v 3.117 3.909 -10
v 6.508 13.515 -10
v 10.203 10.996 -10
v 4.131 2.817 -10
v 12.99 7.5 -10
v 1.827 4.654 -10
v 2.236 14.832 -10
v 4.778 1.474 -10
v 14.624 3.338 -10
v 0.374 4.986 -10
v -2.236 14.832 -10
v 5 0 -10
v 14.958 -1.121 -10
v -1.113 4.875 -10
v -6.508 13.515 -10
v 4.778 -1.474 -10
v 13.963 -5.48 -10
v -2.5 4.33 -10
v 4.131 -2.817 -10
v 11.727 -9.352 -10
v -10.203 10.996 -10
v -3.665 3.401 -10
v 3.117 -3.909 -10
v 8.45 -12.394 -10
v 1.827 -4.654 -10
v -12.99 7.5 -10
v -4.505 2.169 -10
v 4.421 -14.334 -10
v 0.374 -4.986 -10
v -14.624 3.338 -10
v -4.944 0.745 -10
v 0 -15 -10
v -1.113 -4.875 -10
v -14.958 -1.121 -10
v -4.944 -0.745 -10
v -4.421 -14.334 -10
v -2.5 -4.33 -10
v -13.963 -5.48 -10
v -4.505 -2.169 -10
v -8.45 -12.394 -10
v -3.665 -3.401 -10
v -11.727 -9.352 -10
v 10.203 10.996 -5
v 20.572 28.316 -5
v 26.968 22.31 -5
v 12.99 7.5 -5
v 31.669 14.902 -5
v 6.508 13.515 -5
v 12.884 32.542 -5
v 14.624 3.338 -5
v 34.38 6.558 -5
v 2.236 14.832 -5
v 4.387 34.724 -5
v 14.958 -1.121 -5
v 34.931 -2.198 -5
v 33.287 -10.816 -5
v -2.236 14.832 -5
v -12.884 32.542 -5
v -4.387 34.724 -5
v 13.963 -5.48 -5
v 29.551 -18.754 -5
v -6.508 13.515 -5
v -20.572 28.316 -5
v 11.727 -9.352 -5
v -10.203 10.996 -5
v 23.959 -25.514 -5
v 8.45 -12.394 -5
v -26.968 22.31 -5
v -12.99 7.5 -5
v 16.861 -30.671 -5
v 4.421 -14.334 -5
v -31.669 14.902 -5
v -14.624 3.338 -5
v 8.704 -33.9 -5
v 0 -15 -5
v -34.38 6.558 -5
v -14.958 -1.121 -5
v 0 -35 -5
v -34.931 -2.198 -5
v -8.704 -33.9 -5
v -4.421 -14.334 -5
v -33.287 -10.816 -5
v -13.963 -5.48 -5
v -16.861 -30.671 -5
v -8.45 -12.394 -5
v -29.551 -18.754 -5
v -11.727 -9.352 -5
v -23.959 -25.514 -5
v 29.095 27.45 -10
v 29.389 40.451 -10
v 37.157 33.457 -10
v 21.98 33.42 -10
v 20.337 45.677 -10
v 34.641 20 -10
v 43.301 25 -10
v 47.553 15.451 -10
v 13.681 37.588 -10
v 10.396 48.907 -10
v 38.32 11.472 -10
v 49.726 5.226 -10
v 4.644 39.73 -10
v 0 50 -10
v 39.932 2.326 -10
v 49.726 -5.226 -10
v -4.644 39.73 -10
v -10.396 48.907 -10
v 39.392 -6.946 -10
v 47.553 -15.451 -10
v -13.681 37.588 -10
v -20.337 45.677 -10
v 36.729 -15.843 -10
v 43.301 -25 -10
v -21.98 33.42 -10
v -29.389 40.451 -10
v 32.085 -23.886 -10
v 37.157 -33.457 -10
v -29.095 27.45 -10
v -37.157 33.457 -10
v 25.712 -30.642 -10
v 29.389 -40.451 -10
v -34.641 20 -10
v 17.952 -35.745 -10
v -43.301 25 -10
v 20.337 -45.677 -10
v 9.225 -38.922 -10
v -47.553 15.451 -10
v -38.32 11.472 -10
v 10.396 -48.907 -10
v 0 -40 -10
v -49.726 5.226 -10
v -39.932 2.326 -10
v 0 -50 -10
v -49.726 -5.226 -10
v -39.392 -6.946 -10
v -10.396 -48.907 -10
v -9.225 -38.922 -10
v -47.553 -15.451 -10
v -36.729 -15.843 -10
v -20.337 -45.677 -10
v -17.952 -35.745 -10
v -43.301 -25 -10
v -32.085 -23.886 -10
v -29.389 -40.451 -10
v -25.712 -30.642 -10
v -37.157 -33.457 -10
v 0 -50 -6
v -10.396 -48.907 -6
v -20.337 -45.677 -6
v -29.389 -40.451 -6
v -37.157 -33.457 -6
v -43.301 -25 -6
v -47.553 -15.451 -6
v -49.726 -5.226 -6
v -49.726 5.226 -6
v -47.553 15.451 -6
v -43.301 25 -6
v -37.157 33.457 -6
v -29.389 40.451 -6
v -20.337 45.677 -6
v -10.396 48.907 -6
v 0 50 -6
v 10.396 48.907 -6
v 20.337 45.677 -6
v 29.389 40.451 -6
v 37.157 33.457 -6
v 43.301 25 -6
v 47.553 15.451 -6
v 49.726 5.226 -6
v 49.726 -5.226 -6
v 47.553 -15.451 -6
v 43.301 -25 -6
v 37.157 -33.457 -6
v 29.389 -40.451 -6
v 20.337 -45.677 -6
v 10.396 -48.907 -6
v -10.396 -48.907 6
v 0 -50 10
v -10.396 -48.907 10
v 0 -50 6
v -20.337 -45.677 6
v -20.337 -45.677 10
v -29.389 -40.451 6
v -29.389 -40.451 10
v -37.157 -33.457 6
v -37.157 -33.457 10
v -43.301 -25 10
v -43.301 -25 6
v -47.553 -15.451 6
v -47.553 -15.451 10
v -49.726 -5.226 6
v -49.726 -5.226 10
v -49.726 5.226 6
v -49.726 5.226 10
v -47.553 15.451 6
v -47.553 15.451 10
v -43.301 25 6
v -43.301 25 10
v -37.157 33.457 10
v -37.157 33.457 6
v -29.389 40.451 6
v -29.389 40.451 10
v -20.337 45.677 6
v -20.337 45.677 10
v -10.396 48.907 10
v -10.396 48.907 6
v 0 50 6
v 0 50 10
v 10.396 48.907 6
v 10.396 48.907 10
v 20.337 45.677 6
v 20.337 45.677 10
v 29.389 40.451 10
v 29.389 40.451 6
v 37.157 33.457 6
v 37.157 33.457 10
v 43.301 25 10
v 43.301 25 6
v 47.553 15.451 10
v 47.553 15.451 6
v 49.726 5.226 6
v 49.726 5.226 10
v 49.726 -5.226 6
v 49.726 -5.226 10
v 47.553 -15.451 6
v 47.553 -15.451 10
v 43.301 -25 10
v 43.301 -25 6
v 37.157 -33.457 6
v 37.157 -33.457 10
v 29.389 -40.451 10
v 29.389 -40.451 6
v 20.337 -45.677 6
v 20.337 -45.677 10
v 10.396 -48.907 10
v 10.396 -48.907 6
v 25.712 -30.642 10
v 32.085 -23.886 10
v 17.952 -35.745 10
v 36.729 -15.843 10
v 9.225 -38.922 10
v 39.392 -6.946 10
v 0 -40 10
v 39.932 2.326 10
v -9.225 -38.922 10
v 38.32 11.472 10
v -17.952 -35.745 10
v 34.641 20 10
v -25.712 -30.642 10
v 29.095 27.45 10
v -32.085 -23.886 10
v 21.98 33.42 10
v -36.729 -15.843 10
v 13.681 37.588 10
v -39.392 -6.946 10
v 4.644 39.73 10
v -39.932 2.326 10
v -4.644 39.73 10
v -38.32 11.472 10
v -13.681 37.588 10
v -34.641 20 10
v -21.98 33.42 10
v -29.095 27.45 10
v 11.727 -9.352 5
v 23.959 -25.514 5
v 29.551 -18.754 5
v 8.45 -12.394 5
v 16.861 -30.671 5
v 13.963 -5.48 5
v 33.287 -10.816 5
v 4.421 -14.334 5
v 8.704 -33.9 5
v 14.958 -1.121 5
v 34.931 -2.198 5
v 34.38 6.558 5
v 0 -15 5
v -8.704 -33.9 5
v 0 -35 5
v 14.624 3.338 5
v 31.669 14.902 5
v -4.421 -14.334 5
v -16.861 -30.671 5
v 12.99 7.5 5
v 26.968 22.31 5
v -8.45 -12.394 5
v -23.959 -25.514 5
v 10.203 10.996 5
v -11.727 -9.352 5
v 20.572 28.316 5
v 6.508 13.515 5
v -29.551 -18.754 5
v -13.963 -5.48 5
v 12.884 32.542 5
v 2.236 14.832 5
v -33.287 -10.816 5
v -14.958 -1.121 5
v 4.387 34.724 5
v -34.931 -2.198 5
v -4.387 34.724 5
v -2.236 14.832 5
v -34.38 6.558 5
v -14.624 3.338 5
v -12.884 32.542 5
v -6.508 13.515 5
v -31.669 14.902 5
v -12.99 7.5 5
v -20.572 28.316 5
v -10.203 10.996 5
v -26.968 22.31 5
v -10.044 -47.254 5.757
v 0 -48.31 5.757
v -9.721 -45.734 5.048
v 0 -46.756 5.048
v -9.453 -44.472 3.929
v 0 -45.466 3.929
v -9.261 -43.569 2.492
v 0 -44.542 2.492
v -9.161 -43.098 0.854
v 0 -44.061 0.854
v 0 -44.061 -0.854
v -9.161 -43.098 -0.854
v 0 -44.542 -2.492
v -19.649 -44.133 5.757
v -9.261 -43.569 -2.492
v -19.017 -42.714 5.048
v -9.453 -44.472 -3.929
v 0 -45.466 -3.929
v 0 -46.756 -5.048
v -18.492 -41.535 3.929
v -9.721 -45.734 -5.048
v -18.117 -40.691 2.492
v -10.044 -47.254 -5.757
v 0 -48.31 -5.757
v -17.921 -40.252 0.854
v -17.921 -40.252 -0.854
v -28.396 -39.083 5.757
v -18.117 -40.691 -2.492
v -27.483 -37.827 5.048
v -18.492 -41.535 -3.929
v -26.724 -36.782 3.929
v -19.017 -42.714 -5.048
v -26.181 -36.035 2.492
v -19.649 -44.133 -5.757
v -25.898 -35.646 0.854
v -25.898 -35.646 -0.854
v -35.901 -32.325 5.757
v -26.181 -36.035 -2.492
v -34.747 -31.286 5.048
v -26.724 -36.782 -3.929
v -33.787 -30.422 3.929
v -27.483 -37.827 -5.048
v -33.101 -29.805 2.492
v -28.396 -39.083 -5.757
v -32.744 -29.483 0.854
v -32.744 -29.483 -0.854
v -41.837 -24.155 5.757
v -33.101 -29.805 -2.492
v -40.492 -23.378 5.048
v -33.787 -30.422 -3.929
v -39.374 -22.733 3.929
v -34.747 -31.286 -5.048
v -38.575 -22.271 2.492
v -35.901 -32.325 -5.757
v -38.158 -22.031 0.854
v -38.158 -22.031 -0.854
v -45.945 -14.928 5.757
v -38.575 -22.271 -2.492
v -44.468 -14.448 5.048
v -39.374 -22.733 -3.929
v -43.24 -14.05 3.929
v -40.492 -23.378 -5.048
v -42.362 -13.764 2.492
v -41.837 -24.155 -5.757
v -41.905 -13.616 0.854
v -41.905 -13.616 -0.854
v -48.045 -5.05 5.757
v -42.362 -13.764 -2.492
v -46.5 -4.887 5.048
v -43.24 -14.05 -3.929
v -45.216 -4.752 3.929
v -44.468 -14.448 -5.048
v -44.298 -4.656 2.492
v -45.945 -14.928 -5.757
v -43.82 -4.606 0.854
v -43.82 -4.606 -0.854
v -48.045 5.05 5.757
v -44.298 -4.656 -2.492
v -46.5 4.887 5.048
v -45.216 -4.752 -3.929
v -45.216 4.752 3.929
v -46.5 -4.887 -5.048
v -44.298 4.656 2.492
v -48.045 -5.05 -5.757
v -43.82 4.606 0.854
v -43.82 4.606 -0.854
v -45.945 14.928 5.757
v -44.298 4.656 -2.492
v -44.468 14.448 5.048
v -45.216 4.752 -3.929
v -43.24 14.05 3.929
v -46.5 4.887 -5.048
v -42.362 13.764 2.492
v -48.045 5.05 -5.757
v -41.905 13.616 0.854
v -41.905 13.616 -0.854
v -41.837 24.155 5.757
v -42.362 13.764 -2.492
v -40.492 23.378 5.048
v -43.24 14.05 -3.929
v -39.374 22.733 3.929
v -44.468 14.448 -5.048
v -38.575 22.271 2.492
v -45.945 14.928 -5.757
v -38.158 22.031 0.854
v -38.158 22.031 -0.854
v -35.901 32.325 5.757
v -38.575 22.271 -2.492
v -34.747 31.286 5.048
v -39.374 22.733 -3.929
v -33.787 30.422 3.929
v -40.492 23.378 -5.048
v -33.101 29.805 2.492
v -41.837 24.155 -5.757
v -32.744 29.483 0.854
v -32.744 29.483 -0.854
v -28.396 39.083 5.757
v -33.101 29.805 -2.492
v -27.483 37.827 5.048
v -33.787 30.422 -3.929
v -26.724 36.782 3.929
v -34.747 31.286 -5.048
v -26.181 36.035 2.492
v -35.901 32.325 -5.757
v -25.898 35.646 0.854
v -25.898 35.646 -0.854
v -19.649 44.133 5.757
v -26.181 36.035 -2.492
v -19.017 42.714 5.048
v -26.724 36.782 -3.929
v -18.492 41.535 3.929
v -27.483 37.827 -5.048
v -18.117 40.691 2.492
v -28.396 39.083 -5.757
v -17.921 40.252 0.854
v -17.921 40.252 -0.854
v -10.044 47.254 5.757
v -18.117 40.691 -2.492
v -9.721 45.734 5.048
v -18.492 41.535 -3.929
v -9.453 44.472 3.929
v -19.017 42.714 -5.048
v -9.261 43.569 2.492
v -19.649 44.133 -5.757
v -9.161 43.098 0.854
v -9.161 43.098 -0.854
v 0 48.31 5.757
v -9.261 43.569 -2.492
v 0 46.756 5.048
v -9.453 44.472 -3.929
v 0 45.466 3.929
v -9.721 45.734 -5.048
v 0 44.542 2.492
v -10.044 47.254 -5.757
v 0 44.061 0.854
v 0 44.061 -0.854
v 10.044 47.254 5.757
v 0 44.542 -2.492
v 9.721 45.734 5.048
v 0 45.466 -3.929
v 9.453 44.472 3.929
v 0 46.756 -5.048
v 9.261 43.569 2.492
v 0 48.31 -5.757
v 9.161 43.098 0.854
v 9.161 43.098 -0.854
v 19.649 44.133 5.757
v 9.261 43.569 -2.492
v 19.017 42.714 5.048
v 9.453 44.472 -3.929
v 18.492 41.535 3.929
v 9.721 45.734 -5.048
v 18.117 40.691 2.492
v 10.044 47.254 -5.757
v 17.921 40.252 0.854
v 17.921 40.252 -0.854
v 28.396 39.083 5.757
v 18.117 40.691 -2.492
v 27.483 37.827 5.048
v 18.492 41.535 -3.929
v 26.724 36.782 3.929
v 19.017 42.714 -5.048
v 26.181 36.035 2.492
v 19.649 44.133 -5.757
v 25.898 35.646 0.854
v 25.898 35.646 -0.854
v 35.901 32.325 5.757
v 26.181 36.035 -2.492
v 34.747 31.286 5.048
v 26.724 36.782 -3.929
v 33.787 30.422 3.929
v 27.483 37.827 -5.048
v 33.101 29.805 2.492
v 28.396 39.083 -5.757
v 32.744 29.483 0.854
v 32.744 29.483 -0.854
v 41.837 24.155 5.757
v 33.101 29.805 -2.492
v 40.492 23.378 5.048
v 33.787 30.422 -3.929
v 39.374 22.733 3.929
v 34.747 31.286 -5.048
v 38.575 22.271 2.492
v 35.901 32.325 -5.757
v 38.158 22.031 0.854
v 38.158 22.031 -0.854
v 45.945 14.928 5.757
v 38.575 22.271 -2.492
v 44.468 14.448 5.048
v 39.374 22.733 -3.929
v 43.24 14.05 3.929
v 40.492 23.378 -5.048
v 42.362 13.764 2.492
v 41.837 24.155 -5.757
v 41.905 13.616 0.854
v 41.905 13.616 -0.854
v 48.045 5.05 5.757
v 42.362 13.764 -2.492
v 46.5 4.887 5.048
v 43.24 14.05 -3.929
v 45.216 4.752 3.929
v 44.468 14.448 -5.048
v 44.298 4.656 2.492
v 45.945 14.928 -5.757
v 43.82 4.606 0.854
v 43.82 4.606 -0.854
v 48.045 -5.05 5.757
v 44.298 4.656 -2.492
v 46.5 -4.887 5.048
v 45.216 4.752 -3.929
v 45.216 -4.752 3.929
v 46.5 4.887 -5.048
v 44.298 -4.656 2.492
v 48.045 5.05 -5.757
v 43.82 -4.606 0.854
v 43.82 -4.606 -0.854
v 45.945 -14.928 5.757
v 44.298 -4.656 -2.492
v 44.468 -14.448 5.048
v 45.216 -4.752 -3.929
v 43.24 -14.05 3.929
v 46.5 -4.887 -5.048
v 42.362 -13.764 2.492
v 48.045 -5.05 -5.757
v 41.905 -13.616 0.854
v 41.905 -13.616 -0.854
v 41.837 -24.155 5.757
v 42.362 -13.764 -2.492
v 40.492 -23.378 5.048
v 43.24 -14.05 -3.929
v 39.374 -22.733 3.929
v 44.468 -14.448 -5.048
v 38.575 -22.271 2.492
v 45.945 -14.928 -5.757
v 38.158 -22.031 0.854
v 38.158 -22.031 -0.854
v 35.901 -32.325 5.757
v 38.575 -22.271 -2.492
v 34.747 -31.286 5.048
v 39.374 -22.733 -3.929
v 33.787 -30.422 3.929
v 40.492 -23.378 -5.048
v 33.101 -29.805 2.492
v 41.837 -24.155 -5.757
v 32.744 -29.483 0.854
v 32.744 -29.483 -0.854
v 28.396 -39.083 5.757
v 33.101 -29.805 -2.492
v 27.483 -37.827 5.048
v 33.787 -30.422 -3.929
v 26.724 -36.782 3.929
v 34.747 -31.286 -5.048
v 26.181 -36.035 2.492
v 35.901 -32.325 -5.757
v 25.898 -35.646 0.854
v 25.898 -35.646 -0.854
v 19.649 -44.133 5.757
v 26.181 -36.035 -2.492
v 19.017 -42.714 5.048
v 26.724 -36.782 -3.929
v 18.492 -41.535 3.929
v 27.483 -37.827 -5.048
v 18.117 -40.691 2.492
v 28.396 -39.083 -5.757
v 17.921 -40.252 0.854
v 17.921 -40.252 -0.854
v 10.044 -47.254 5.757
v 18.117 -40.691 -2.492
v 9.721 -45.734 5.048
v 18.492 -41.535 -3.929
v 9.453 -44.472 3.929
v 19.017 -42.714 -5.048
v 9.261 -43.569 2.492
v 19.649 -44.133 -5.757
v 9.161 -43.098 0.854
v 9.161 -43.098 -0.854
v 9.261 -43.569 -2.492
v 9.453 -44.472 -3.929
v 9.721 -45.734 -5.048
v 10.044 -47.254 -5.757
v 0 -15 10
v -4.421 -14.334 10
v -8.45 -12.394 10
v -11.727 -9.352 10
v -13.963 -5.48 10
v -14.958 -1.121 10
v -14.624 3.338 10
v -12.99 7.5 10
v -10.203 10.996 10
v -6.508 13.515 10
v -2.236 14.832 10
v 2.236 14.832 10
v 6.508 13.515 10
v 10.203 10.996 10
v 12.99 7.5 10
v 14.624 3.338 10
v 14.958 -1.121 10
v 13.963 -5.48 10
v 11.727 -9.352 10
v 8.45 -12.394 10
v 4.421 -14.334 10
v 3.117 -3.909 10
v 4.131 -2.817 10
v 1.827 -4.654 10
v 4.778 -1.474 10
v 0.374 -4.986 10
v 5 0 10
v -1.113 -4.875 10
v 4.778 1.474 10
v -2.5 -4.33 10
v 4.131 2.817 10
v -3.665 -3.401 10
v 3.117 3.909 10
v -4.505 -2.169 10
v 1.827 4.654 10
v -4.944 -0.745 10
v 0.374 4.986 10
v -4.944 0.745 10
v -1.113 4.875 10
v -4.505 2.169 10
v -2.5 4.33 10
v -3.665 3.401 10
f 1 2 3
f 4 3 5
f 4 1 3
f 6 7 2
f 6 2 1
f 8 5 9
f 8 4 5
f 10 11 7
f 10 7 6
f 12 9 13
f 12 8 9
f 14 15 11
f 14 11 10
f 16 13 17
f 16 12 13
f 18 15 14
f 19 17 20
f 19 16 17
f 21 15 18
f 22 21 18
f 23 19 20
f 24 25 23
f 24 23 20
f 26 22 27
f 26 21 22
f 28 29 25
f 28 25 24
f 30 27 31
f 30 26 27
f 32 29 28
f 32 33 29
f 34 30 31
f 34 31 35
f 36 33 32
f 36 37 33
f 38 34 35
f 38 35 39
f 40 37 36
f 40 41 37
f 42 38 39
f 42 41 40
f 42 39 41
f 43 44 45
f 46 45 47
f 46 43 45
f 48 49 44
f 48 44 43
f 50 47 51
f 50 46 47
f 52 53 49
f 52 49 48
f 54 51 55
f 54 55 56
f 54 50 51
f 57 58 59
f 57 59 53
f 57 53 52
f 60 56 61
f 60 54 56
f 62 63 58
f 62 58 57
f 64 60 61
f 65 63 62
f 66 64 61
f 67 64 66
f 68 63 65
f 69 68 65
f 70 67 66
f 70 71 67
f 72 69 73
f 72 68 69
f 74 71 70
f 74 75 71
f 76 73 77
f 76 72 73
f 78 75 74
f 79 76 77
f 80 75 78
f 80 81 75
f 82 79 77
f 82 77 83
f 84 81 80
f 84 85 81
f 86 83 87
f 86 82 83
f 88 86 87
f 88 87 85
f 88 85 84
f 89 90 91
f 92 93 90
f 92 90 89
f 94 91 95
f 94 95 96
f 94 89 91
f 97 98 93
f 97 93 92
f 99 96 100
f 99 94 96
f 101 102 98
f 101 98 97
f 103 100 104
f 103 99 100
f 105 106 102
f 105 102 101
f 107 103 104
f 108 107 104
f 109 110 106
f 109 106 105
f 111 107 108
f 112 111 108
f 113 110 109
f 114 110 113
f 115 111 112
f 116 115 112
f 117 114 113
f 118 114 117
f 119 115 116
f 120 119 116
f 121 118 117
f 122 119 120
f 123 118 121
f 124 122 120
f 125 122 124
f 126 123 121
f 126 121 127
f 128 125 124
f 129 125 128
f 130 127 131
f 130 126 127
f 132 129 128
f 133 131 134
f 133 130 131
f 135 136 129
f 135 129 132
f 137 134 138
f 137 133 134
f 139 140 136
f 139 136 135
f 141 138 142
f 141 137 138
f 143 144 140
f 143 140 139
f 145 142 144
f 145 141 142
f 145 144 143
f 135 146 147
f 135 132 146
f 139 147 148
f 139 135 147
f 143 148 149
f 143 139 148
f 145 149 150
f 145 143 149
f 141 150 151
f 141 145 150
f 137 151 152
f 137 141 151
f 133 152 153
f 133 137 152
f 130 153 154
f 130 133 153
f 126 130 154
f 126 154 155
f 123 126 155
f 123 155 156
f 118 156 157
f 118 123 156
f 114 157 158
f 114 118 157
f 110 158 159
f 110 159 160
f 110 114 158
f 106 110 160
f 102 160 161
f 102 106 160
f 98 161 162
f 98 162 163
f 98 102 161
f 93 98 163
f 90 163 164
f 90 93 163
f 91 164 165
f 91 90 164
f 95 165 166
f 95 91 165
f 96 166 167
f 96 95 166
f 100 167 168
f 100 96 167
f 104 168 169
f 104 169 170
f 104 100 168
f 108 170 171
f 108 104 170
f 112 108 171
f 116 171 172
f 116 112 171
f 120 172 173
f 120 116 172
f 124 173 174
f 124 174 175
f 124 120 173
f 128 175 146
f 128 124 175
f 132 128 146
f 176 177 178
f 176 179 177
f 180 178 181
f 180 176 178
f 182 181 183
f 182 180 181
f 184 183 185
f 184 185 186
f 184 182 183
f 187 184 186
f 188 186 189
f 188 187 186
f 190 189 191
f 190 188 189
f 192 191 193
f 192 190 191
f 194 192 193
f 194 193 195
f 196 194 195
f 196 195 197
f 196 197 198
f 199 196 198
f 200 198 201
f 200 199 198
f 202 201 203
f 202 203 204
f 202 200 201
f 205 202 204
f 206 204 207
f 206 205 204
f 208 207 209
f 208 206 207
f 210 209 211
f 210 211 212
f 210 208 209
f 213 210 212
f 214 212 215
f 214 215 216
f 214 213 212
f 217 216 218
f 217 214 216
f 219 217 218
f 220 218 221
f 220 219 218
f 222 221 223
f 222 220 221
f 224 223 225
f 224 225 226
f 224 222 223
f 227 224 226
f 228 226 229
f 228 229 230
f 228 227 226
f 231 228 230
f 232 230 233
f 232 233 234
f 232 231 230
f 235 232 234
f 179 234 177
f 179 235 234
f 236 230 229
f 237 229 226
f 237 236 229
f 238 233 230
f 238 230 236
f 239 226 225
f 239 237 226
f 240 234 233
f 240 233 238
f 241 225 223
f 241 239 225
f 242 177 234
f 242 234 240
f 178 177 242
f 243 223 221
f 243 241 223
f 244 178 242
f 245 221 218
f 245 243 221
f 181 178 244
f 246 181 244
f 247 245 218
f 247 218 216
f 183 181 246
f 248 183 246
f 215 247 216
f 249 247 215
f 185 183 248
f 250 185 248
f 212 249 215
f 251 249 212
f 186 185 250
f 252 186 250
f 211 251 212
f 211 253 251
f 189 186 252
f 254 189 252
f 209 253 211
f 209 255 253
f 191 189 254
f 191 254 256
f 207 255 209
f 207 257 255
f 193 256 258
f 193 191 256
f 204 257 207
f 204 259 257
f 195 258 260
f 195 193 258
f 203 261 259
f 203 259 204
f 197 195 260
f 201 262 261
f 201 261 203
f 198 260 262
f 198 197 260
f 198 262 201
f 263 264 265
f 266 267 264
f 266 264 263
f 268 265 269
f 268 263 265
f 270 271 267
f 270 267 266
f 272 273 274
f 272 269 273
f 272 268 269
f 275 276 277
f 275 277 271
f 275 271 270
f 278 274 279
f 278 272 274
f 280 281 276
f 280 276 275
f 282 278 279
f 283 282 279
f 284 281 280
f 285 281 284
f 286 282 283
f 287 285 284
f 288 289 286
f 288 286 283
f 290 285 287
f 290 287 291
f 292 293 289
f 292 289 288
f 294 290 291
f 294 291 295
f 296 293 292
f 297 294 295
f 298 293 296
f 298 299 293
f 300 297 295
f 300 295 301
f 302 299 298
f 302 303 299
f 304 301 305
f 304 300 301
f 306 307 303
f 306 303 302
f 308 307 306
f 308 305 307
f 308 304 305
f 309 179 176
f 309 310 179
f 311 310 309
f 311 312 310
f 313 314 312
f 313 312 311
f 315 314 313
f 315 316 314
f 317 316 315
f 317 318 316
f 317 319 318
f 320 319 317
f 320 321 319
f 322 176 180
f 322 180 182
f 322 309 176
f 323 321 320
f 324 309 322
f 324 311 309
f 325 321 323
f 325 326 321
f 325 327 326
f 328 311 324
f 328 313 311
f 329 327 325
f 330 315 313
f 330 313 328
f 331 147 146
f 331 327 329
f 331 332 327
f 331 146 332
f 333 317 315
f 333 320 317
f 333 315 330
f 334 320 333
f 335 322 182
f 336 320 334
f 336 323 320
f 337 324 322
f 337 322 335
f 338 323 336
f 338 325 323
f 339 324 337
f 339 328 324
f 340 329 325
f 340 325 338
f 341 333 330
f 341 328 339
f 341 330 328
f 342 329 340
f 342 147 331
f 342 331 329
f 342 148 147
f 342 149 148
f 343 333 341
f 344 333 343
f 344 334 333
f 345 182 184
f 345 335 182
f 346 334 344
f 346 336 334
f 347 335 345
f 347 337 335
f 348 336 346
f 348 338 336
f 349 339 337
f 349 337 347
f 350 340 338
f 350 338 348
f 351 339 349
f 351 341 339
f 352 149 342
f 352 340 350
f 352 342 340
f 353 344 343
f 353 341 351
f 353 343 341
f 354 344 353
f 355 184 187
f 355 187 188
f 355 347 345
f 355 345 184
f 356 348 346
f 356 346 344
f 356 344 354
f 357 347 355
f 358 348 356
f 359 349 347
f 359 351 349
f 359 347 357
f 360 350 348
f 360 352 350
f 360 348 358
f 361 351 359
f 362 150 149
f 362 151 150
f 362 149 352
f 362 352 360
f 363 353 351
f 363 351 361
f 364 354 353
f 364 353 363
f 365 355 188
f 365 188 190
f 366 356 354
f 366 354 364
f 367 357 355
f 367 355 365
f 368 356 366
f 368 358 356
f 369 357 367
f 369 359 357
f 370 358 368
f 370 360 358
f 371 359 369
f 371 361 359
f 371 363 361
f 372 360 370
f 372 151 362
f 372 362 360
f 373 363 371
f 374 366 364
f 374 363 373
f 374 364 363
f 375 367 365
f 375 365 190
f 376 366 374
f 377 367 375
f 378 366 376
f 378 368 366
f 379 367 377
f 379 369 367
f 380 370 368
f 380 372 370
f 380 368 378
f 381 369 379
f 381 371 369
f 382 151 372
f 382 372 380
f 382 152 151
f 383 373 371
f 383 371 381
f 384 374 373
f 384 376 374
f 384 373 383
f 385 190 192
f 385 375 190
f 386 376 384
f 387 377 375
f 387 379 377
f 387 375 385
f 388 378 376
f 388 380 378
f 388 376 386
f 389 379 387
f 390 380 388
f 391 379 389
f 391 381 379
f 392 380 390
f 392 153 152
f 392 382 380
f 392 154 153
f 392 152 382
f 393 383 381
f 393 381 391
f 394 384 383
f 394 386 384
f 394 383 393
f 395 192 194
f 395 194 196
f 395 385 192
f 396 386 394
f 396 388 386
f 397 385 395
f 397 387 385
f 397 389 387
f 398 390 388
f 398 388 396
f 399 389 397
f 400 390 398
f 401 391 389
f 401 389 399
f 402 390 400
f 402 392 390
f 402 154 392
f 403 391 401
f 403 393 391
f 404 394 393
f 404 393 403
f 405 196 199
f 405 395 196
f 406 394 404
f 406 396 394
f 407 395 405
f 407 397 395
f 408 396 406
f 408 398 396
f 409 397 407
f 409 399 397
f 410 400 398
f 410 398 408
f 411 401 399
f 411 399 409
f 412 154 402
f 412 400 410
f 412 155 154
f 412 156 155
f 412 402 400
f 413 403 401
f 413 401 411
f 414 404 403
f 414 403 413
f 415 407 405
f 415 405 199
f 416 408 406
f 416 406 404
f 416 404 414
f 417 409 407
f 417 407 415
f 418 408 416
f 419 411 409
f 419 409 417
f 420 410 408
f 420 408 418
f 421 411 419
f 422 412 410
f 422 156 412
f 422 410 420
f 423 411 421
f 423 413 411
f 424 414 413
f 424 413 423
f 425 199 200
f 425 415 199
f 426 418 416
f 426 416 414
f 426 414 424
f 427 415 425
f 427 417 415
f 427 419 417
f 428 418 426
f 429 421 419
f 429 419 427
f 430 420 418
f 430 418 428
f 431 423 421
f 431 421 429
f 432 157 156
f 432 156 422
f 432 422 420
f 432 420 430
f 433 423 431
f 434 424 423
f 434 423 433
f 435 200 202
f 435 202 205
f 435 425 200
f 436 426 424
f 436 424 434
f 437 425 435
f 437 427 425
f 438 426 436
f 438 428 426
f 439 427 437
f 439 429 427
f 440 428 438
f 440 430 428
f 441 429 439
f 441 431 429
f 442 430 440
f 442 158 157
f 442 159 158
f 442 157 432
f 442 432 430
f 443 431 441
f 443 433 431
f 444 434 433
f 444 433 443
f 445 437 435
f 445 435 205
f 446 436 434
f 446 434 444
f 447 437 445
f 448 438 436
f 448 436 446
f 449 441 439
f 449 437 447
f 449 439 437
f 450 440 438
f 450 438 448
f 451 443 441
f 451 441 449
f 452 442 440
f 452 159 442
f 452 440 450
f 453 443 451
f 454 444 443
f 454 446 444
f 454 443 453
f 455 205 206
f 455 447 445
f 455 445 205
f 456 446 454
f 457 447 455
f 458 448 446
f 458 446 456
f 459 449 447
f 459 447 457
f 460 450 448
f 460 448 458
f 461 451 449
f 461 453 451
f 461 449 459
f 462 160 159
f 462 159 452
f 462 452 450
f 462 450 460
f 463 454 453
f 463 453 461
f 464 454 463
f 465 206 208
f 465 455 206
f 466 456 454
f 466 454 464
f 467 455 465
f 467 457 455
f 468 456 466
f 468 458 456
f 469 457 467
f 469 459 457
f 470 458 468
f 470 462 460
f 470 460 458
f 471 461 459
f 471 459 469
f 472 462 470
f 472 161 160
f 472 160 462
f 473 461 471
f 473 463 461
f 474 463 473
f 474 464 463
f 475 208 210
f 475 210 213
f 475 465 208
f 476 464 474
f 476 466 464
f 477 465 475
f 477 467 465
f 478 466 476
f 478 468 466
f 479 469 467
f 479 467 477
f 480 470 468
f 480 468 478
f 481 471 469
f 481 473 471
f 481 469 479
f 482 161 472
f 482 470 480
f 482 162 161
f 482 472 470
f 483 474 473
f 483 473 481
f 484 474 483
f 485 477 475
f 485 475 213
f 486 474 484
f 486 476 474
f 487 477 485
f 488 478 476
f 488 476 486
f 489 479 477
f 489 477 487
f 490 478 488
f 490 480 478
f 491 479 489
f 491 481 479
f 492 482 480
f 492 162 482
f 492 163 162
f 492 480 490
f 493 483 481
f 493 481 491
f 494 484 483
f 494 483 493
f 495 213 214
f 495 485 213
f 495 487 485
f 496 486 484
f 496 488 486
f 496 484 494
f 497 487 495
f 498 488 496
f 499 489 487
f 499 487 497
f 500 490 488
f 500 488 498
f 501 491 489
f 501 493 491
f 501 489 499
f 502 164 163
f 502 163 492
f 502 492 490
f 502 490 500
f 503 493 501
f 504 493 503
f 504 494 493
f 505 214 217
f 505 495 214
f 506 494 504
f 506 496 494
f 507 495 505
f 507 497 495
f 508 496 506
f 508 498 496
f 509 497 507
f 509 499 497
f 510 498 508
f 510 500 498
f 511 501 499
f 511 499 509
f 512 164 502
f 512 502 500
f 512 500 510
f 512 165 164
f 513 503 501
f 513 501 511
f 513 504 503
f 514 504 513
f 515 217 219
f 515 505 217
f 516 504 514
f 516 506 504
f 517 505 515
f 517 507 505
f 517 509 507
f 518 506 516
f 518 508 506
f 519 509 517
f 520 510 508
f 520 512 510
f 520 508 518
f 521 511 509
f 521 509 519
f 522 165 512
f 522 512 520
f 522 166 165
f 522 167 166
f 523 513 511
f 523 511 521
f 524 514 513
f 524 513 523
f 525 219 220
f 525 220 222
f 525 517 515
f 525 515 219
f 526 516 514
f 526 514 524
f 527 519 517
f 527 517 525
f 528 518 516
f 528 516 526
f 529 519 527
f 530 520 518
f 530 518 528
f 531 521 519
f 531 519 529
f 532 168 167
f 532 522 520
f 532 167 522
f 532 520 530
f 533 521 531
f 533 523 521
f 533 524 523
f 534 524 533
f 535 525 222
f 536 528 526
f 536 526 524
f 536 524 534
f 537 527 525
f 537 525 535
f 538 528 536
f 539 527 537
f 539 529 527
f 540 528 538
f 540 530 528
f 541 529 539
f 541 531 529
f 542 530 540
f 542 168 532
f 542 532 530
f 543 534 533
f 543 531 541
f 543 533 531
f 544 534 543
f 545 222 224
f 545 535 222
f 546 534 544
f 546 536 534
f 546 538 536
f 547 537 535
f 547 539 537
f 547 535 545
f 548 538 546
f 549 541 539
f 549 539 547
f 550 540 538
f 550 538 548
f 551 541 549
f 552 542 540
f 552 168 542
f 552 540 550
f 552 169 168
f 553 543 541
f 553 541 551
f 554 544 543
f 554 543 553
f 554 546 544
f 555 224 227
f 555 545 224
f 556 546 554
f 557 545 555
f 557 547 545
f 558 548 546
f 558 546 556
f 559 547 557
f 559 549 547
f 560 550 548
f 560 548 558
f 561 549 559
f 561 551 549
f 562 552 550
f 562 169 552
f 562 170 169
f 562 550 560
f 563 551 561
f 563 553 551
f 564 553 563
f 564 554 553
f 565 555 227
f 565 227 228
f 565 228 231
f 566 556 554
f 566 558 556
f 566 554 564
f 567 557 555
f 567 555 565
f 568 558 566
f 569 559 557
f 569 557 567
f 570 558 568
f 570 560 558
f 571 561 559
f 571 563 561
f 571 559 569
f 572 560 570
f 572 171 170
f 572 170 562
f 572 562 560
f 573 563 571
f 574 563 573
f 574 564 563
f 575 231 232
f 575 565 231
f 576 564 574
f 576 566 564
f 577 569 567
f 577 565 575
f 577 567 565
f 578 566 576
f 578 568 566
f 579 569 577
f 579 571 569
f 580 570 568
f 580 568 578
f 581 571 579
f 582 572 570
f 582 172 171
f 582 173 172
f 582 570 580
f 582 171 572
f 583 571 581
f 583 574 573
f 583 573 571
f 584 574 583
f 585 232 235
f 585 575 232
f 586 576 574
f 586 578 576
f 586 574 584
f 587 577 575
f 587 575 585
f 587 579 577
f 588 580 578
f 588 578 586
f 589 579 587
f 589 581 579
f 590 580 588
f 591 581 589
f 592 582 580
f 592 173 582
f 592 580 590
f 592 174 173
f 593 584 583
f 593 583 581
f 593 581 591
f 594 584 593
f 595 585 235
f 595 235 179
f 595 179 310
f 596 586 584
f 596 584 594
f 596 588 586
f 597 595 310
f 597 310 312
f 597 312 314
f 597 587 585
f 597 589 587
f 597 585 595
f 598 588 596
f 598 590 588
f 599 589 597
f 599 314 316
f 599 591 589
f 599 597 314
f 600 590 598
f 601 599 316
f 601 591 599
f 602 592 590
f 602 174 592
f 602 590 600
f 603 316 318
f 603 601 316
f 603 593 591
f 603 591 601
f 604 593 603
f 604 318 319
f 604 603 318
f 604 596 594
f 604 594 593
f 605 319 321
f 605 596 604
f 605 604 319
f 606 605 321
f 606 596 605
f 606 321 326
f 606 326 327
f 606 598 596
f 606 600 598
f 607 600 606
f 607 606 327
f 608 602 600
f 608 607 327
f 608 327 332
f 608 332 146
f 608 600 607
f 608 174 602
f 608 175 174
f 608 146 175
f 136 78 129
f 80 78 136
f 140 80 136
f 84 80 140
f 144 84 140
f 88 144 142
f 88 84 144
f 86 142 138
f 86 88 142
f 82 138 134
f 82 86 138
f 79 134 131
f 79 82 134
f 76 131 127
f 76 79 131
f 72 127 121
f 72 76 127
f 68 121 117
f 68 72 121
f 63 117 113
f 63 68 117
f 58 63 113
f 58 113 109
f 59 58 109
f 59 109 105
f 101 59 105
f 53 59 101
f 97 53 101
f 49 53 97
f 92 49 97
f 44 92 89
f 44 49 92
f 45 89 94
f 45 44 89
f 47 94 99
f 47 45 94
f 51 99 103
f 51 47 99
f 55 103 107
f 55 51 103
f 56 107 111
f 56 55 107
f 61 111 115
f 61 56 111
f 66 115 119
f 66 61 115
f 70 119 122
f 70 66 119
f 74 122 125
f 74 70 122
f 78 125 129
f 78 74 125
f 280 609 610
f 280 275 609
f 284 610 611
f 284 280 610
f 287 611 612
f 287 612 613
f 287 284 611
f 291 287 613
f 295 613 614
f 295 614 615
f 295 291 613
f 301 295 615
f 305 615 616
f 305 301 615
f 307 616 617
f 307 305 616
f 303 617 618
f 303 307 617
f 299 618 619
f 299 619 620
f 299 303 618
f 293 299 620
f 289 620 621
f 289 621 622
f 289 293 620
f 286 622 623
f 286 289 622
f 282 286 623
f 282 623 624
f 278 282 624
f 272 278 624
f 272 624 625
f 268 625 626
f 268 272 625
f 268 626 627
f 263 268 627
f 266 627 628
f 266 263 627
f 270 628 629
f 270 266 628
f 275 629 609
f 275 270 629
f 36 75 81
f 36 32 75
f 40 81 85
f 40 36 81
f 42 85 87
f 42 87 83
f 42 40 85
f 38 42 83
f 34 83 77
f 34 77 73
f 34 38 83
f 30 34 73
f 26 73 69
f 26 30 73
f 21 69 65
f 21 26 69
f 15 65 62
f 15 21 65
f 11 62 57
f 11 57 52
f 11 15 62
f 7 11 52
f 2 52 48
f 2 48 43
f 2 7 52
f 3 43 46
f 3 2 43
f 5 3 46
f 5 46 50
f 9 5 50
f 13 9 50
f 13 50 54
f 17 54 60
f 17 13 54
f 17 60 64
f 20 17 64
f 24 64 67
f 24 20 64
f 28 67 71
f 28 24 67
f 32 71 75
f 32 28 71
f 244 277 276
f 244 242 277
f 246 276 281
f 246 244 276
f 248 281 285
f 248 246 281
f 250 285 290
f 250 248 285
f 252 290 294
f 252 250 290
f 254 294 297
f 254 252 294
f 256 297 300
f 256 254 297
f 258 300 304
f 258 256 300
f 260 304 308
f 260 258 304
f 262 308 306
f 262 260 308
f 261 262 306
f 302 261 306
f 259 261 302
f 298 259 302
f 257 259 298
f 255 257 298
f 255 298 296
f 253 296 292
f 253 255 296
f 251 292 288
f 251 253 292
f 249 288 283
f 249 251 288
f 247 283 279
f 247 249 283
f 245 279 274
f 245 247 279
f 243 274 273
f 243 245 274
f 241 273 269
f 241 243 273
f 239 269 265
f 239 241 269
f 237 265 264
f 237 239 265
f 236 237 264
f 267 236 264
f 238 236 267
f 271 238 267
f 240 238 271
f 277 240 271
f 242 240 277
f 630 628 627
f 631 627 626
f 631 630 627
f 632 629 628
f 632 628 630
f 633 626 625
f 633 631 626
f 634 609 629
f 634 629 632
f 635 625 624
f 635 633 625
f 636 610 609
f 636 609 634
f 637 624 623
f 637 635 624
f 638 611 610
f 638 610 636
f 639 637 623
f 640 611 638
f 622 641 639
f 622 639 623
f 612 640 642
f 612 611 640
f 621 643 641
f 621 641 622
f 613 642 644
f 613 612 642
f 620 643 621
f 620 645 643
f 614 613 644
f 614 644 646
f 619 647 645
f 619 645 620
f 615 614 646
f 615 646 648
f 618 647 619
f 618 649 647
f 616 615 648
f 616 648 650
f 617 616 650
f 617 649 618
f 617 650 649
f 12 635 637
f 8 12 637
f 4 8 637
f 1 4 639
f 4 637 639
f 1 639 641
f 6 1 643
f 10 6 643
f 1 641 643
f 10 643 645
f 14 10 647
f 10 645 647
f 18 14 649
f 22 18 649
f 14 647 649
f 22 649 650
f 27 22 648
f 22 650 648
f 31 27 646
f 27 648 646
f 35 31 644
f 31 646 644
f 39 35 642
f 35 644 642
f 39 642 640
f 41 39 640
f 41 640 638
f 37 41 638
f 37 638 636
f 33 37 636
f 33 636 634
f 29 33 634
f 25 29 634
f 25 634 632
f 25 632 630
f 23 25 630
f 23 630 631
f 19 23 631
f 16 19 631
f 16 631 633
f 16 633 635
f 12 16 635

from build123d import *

# Parameters (mm, degrees)
SKETCH_2_R          = 5
CUT_EXTRUDE_1_DEPTH = 74.484692283


with BuildPart() as part:
    # Эскиз1 → Повернуть1 (revolve)
    with BuildSketch(Plane(origin=(0, 0, 0), x_dir=(0, 0, -1), z_dir=(1, 0, 0)), mode=Mode.PRIVATE) as revolve_1_sk:
        with BuildLine():
            Line((6, 50), (10, 50))
            Line((10, 50), (10, 40))
            Line((10, 40), (5, 35))
            Line((5, 35), (5, 15))
            Line((5, 15), (10, 15))
            Line((10, 15), (10, 0))
            Line((10, 0), (-10, 0))
            Line((-10, 0), (-10, 15))
            Line((-10, 15), (-5, 15))
            Line((-5, 15), (-5, 35))
            Line((-5, 35), (-10, 40))
            Line((-10, 40), (-10, 50))
            Line((-10, 50), (-6, 50))
            ThreePointArc((-6, 50), (0, 44), (6, 50))
        make_face()
    revolve(revolve_1_sk.sketch.rotate(Axis((0, 0, 10), (0, 0, -1)), 180), axis=Axis((0, 0, 10), (0, 0, -1)))

    # Эскиз2 → Вырез-Вытянуть1 (cut, through all)
    with BuildSketch(Plane.XY.offset(10)):
        Circle(SKETCH_2_R)
    extrude(amount=-CUT_EXTRUDE_1_DEPTH, mode=Mode.SUBTRACT)


solid = part.part
